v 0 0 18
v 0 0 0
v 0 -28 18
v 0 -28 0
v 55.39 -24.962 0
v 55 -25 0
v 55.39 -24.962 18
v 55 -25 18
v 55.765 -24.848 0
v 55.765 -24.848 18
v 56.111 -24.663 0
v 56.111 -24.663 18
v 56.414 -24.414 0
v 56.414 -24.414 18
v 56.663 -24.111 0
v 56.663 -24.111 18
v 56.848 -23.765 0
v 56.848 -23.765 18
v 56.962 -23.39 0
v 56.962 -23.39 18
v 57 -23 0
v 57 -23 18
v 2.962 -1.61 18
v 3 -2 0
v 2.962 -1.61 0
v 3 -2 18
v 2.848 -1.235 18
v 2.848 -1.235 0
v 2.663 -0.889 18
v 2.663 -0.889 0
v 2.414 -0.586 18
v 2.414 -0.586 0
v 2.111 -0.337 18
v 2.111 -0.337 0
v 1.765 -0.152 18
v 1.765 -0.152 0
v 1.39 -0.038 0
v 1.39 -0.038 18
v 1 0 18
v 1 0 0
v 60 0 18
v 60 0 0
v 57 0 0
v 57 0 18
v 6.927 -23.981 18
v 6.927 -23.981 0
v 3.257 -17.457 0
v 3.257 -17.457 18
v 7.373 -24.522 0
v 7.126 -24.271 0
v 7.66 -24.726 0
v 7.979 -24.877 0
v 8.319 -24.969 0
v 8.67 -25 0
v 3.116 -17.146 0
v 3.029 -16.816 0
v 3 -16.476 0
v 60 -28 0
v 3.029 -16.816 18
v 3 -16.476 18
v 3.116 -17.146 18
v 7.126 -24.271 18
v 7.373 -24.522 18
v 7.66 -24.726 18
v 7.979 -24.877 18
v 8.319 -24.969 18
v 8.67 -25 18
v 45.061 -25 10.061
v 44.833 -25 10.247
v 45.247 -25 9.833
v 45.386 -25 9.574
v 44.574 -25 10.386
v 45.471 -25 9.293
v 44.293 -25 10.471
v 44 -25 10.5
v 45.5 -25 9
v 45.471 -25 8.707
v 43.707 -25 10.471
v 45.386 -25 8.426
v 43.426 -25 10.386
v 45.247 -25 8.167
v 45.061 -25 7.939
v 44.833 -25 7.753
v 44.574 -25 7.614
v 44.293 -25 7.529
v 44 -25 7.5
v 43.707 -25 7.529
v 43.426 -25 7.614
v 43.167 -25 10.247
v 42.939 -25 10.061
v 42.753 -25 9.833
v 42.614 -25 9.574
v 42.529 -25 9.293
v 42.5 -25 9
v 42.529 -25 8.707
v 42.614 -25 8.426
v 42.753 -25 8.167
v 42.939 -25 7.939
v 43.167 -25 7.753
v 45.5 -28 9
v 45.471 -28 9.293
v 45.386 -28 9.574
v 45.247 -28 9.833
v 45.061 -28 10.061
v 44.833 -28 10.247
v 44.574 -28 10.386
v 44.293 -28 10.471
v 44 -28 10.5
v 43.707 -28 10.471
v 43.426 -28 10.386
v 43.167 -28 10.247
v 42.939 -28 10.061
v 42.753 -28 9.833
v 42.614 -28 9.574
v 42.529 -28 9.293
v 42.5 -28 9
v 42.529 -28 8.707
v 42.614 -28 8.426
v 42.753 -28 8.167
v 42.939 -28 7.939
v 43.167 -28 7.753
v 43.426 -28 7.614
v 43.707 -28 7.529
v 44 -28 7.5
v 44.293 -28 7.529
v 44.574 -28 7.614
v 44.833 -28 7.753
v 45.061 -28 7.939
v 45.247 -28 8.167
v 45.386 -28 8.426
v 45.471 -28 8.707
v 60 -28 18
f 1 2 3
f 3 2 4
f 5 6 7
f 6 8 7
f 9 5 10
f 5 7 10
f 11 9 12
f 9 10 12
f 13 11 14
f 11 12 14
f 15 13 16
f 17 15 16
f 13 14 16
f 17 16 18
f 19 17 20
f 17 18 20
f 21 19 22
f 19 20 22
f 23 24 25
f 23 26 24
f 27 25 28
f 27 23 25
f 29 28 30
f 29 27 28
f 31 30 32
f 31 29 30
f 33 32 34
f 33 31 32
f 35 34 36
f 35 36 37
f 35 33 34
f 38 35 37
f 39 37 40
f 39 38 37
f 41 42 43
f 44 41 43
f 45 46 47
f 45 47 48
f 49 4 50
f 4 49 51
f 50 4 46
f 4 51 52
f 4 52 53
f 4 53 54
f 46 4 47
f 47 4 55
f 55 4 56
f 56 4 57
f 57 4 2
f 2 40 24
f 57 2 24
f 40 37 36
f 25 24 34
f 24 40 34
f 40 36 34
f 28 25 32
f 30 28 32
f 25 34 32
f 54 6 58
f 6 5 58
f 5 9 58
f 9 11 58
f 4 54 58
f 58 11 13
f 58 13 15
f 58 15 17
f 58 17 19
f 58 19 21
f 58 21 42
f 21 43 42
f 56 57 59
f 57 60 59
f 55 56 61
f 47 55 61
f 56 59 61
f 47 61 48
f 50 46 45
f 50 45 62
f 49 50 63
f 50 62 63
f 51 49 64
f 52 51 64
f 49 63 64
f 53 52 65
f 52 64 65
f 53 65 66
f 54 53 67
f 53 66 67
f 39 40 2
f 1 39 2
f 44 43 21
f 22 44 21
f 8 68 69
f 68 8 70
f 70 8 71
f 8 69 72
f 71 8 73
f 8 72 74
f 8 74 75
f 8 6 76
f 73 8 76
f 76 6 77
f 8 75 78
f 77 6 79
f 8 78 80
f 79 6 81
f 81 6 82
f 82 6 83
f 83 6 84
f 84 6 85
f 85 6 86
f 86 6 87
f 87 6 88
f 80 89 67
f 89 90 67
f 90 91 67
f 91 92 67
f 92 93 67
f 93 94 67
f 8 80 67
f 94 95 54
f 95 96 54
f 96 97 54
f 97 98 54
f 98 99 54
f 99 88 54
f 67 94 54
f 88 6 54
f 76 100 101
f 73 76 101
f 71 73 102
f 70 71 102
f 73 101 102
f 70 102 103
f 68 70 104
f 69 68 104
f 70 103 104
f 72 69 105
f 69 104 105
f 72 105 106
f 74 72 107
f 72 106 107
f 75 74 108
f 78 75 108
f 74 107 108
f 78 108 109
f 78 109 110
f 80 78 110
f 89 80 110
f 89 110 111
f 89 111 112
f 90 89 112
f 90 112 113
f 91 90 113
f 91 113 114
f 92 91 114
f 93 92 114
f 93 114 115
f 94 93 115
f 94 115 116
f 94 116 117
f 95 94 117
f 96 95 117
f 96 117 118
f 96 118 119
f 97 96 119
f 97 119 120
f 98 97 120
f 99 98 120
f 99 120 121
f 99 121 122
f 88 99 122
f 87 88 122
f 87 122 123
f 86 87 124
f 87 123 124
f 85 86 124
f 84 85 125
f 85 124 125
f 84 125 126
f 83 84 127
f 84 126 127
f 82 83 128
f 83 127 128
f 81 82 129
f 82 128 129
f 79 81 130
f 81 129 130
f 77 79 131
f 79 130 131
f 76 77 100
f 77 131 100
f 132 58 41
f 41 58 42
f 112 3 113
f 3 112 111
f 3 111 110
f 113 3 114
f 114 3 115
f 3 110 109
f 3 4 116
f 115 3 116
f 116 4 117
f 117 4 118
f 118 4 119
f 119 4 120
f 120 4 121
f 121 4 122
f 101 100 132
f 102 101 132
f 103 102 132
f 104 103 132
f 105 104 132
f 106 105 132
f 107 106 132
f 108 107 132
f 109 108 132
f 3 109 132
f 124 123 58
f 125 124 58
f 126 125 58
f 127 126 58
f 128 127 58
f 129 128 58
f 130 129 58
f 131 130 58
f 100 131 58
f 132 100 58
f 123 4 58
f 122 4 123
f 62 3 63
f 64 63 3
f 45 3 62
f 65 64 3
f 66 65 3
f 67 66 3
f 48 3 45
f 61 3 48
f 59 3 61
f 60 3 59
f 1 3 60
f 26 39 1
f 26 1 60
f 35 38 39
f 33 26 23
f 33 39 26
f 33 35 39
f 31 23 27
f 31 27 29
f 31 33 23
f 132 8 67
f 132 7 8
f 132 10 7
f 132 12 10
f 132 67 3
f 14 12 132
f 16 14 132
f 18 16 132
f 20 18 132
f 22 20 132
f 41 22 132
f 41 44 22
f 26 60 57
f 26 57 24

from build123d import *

# Parameters (mm, degrees)
F1_DEPTH = 18
F2_R     = 1.5
F3_DEPTH = 28.001
F4_SIZE2 = 4.5
F4_SIZE  = 8
F5_R     = 2


with BuildPart() as f1:
    # F0 (on Top) → F1 (new body)
    with BuildSketch(Plane.XY):
        Polygon((3, 0), (0, 0), (0, -28), (60, -28), (60, 0), (57, 0), (57, -25), (3, -25), align=None)
    extrude(amount=F1_DEPTH)

    # F2 (on face) → F3 (cut, through all)
    with BuildSketch(Plane.XZ.offset(28)):
        with Locations((44, 9)):
            Circle(F2_R)
    extrude(amount=-F3_DEPTH, mode=Mode.SUBTRACT)

    # F4
    f4_edges = [f1.edges().sort_by_distance(p)[0] for p in [
        (3, -25, 9),
    ]]
    f4_side = f1.faces().sort_by_distance((3, -12.5, 9))[0]
    chamfer(f4_edges, length=F4_SIZE, length2=F4_SIZE2, reference=f4_side)

    # F5
    f5_edges = [f1.edges().sort_by_distance(p)[0] for p in [
        (57, -25, 9),
        (7.5, -25, 9),
        (3, -17, 9),
        (3, 0, 9),
    ]]
    fillet(f5_edges, radius=F5_R)


solid = f1.part
